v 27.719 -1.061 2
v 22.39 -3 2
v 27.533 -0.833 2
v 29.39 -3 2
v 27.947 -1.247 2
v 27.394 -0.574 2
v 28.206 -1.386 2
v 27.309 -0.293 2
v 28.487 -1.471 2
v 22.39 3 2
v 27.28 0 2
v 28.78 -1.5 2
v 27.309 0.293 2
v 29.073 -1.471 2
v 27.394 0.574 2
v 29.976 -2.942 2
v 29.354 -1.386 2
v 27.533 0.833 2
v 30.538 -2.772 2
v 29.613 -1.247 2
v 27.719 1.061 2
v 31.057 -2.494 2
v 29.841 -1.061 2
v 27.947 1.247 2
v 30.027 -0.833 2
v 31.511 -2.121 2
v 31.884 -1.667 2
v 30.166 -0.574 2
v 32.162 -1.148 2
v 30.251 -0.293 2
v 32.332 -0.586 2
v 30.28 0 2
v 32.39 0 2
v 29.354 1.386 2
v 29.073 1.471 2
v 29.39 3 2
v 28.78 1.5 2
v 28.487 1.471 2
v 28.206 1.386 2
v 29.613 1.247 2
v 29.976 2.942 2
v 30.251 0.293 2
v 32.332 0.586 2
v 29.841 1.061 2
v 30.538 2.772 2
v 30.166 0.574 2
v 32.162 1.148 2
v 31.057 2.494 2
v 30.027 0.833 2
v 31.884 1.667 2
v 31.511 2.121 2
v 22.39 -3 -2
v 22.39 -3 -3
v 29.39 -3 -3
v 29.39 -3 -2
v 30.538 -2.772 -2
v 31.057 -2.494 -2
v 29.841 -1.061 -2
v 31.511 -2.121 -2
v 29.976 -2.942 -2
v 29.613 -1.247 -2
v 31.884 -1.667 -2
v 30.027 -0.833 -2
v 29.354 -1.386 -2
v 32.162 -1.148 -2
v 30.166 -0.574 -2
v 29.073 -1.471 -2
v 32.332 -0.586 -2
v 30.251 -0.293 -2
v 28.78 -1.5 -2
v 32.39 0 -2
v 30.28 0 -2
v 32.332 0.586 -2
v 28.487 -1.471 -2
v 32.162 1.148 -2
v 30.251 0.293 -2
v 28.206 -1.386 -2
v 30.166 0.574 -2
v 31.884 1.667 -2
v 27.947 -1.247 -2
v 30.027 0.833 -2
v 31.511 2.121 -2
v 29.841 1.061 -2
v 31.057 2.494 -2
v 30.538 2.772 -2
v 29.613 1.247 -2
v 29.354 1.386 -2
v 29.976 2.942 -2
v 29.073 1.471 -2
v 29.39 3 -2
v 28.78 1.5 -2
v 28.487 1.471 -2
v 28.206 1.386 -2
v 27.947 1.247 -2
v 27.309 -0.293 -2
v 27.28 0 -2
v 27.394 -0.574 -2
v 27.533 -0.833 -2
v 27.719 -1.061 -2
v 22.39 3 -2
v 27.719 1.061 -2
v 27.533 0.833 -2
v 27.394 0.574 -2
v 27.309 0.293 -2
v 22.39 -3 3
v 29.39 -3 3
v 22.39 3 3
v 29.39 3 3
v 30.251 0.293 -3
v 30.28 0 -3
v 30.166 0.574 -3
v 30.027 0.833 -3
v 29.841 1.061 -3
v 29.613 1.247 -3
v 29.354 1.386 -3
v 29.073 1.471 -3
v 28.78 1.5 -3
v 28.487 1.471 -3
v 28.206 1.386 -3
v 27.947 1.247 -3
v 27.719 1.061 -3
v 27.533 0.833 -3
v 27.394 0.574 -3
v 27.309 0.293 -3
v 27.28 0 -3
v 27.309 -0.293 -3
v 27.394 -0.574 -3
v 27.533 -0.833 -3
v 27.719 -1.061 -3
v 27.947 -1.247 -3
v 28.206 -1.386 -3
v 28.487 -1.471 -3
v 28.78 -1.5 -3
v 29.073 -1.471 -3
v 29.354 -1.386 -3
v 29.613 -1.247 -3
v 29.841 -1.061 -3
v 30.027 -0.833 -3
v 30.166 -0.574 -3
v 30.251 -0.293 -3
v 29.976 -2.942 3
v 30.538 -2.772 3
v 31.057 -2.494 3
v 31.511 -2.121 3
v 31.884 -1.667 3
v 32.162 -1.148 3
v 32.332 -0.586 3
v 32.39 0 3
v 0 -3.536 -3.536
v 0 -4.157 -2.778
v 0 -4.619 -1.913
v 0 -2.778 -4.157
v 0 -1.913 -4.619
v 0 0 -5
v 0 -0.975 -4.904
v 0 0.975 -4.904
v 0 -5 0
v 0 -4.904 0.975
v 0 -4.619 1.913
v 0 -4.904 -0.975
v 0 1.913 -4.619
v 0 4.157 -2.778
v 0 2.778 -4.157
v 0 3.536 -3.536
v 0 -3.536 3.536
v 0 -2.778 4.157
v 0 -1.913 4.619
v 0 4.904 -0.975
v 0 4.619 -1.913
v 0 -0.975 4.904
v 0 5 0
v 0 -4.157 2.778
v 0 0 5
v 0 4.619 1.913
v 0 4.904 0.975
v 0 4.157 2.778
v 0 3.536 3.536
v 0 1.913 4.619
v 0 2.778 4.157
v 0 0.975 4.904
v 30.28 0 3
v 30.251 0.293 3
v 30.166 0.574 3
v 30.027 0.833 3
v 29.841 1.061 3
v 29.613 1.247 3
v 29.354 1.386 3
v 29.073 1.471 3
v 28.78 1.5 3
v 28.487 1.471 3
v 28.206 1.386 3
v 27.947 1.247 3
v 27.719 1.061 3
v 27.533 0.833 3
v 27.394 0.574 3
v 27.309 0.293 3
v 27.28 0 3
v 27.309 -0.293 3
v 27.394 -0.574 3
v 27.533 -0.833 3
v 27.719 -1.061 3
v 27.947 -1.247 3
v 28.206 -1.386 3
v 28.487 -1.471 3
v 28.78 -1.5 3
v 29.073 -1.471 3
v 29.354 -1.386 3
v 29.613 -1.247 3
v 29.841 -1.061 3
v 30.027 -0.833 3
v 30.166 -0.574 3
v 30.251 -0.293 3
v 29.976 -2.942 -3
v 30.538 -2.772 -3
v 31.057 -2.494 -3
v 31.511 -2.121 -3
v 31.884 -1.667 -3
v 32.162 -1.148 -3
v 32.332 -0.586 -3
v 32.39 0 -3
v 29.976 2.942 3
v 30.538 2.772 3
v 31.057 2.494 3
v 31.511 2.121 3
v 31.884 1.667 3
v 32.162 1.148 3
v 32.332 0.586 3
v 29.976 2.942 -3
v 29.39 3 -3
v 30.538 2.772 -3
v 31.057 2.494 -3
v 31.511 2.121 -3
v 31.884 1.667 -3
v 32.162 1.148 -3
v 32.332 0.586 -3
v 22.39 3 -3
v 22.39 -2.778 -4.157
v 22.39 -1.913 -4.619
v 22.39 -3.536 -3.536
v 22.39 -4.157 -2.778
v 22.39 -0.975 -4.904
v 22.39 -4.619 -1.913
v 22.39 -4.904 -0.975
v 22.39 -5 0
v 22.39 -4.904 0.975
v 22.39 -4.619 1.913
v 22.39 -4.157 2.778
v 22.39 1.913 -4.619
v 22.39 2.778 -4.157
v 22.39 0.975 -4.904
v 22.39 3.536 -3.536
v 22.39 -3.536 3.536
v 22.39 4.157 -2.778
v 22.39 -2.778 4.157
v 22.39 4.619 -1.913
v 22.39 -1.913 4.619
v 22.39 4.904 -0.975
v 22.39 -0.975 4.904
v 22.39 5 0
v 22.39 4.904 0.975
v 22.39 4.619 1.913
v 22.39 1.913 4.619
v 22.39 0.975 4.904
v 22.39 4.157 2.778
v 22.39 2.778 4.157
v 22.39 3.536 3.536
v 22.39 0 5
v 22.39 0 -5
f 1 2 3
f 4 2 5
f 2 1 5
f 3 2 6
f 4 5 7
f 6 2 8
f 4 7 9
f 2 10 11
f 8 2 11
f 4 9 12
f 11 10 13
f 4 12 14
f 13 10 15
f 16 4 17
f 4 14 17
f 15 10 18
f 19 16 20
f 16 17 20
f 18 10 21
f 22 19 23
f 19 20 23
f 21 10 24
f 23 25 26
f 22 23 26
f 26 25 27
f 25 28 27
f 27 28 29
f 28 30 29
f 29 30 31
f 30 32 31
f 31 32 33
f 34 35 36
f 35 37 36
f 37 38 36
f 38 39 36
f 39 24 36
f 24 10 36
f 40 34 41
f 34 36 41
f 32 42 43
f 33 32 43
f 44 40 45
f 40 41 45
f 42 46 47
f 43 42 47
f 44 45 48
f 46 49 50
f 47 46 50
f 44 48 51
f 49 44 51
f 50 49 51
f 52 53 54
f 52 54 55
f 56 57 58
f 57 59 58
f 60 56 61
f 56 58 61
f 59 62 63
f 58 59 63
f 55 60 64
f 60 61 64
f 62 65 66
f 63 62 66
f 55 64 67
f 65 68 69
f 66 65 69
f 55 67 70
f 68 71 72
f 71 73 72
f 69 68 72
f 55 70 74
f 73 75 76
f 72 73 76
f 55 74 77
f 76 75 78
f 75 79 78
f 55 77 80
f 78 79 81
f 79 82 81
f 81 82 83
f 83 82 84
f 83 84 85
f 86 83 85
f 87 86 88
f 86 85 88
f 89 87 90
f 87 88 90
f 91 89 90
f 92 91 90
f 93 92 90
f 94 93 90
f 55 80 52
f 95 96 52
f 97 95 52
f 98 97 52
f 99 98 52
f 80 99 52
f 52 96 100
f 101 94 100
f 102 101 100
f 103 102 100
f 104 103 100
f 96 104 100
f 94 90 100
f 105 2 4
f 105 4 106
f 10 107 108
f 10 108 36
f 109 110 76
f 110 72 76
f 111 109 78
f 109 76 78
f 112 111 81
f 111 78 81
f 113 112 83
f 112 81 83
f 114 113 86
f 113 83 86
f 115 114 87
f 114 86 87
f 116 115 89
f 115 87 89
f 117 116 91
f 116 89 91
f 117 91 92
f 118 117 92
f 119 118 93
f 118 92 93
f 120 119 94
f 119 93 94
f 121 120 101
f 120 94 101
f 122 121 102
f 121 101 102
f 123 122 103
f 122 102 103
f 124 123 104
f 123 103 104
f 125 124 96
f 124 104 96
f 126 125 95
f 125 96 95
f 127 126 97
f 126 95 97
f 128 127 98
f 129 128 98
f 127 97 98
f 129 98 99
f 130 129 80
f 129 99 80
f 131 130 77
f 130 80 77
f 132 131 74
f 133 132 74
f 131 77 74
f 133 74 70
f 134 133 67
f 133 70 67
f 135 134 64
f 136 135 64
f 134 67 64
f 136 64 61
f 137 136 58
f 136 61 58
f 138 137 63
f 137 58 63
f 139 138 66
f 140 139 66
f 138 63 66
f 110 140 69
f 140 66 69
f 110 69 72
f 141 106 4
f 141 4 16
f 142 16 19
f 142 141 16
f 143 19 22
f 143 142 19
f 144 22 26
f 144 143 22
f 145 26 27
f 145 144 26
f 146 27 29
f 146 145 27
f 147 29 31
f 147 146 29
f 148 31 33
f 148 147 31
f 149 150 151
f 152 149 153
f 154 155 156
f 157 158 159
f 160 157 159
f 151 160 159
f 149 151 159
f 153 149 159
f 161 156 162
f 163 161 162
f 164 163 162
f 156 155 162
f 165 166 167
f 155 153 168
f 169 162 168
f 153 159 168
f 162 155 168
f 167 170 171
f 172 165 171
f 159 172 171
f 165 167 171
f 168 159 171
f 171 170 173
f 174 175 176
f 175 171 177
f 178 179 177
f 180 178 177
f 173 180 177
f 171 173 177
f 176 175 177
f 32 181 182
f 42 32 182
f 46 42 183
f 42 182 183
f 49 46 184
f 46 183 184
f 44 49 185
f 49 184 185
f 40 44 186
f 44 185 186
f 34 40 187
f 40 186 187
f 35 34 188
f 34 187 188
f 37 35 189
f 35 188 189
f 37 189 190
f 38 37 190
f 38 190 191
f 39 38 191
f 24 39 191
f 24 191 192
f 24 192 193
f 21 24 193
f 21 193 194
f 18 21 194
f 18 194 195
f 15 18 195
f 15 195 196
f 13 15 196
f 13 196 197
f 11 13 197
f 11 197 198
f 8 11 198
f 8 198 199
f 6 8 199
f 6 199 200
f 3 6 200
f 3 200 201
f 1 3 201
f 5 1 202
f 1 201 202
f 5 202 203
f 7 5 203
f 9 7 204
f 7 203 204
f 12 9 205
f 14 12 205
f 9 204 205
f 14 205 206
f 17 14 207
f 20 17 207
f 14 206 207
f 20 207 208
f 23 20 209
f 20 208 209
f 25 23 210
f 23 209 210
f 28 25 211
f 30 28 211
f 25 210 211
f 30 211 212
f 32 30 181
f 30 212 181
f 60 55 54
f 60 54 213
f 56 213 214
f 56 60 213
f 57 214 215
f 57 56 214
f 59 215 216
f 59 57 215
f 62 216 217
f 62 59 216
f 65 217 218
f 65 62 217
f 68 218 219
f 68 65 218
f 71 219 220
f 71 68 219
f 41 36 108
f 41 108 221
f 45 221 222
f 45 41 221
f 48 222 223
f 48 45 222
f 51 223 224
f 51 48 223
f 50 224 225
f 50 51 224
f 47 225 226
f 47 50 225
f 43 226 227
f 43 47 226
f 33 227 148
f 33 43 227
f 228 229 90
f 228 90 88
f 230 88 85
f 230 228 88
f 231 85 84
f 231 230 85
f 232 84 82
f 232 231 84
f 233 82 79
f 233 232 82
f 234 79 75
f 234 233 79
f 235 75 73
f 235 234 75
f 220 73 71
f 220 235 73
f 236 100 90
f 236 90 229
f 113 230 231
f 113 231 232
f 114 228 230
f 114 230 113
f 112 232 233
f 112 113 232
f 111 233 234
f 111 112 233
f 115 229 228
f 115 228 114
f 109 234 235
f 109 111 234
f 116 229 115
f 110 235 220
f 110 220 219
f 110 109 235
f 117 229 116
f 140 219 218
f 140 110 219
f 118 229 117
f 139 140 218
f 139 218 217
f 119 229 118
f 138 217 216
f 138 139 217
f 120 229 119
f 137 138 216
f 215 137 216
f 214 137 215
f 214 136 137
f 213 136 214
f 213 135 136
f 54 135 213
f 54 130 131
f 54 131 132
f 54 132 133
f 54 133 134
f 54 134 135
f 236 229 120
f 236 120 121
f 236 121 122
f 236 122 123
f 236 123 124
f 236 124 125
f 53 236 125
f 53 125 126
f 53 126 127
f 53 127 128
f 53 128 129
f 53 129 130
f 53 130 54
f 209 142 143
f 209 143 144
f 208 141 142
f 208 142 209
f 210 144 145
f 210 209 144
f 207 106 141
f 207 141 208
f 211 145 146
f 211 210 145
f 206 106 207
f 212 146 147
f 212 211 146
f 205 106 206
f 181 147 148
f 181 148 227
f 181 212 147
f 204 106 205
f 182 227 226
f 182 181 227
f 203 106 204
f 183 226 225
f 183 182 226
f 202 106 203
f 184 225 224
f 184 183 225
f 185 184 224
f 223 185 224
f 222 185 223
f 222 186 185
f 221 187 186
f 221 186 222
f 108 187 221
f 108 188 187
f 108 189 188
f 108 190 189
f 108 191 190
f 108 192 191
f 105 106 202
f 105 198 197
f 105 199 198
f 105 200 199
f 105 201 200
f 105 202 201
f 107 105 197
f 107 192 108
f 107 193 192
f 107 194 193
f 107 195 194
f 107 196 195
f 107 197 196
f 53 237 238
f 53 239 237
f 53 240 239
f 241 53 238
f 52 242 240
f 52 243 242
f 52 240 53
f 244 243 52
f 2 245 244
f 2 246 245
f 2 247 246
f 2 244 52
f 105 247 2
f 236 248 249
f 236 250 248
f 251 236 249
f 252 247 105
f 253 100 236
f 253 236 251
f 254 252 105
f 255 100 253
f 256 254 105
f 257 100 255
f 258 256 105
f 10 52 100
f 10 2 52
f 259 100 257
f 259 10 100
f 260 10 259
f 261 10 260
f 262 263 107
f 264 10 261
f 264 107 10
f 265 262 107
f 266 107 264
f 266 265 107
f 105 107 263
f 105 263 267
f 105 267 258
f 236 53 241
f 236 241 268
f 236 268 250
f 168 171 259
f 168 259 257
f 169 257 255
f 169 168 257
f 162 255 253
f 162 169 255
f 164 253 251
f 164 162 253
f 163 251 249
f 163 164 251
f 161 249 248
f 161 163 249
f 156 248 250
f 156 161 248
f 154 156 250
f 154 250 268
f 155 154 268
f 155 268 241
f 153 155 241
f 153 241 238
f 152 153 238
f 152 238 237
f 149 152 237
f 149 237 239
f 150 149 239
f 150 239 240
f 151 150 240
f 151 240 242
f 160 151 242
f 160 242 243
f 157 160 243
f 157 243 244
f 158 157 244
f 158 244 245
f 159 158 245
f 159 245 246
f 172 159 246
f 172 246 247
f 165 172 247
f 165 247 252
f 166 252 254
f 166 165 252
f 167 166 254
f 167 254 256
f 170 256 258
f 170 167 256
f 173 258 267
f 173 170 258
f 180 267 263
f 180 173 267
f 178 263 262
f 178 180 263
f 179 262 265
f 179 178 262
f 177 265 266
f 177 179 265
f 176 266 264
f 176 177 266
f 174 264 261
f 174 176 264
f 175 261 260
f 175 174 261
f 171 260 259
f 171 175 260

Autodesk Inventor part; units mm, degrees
ref_plane "YZ Plane" through (0, 0, 0) normal (1, 0, 0) x (0, 1, 0)
ref_plane "XZ Plane" through (0, 0, 0) normal (0, 1, 0) x (-1, 0, 0)
ref_plane "XY Plane" through (0, 0, 0) normal (0, 0, 1) x (1, 0, 0)
sketch "Schizzo1" plane through (0, 0, 0) normal (1, 0, 0) x (0, 1, 0)
  circle A0 centre (0, 0) radius 5
  dimension "d0" = 10
extrude "Estrusione1" add sketch "Schizzo1" along normal blind 22.39
sketch "Schizzo2" plane through (22.39, 0, 0) normal (1, 0, 0) x (0, 0, -1)
  line L0 (-3, 3) -> (3, 3)
  line L1 (3, 3) -> (3, -3)
  line L2 (3, -3) -> (-3, -3)
  line L3 (-3, -3) -> (-3, 3)
  line L4 (-3, 3) -> (3, -3) construction
  line L5 (3, 3) -> (-3, -3) construction
  point P0 (0, 0)
  point P1 (0, 0)
  point P2 (0, 0)
  dimension "d3" = 6
  dimension "d4" = 6
extrude "Estrusione2" add sketch "Schizzo2" along normal blind 10
sketch "Schizzo5" plane through (22.39, 3, 3) normal (0, 1, 0) x (1, 0, 0)
  line L0 (0, -2) -> (0, 8) projected
  line L1 (10, 5) -> (0, 5)
  line L2 (0, 5) -> (0, 1)
  line L3 (0, 1) -> (10, 1)
  line L4 (10, 1) -> (10, 5)
  line L5 (10, 6) -> (10, 0) projected
  point P0 (-22.39, 3)
  point P1 (10, 3)
  point P2 (0, 5)
  dimension "d19" = 4
extrude "Estrusione5" cut sketch "Schizzo5" against normal blind 15
sketch "Schizzo6" plane through (22.39, -3, 3) normal (0, 0, 1) x (1, 0, 0)
  circle A0 centre (6.39, 3) radius 1.5
  line L0 (0, 0) -> (10, 0) projected
  line L1 (10, 6) -> (10, 0) projected
  line L2 (0, -2) -> (0, 8) projected
  point P0 (-22.39, 3)
  dimension "d22" = 3
  dimension "d24" = 3
  dimension "d28" = 6.39
extrude "Estrusione6" cut sketch "Schizzo6" against normal blind 15
fillet "Raccordo2" radius 3 4 edges at (32.39, 3, 2.5) (32.39, 3, -2.5) (32.39, -3, -2.5) (32.39, -3, 2.5)
properties part number "pistone" material "Titanio"
